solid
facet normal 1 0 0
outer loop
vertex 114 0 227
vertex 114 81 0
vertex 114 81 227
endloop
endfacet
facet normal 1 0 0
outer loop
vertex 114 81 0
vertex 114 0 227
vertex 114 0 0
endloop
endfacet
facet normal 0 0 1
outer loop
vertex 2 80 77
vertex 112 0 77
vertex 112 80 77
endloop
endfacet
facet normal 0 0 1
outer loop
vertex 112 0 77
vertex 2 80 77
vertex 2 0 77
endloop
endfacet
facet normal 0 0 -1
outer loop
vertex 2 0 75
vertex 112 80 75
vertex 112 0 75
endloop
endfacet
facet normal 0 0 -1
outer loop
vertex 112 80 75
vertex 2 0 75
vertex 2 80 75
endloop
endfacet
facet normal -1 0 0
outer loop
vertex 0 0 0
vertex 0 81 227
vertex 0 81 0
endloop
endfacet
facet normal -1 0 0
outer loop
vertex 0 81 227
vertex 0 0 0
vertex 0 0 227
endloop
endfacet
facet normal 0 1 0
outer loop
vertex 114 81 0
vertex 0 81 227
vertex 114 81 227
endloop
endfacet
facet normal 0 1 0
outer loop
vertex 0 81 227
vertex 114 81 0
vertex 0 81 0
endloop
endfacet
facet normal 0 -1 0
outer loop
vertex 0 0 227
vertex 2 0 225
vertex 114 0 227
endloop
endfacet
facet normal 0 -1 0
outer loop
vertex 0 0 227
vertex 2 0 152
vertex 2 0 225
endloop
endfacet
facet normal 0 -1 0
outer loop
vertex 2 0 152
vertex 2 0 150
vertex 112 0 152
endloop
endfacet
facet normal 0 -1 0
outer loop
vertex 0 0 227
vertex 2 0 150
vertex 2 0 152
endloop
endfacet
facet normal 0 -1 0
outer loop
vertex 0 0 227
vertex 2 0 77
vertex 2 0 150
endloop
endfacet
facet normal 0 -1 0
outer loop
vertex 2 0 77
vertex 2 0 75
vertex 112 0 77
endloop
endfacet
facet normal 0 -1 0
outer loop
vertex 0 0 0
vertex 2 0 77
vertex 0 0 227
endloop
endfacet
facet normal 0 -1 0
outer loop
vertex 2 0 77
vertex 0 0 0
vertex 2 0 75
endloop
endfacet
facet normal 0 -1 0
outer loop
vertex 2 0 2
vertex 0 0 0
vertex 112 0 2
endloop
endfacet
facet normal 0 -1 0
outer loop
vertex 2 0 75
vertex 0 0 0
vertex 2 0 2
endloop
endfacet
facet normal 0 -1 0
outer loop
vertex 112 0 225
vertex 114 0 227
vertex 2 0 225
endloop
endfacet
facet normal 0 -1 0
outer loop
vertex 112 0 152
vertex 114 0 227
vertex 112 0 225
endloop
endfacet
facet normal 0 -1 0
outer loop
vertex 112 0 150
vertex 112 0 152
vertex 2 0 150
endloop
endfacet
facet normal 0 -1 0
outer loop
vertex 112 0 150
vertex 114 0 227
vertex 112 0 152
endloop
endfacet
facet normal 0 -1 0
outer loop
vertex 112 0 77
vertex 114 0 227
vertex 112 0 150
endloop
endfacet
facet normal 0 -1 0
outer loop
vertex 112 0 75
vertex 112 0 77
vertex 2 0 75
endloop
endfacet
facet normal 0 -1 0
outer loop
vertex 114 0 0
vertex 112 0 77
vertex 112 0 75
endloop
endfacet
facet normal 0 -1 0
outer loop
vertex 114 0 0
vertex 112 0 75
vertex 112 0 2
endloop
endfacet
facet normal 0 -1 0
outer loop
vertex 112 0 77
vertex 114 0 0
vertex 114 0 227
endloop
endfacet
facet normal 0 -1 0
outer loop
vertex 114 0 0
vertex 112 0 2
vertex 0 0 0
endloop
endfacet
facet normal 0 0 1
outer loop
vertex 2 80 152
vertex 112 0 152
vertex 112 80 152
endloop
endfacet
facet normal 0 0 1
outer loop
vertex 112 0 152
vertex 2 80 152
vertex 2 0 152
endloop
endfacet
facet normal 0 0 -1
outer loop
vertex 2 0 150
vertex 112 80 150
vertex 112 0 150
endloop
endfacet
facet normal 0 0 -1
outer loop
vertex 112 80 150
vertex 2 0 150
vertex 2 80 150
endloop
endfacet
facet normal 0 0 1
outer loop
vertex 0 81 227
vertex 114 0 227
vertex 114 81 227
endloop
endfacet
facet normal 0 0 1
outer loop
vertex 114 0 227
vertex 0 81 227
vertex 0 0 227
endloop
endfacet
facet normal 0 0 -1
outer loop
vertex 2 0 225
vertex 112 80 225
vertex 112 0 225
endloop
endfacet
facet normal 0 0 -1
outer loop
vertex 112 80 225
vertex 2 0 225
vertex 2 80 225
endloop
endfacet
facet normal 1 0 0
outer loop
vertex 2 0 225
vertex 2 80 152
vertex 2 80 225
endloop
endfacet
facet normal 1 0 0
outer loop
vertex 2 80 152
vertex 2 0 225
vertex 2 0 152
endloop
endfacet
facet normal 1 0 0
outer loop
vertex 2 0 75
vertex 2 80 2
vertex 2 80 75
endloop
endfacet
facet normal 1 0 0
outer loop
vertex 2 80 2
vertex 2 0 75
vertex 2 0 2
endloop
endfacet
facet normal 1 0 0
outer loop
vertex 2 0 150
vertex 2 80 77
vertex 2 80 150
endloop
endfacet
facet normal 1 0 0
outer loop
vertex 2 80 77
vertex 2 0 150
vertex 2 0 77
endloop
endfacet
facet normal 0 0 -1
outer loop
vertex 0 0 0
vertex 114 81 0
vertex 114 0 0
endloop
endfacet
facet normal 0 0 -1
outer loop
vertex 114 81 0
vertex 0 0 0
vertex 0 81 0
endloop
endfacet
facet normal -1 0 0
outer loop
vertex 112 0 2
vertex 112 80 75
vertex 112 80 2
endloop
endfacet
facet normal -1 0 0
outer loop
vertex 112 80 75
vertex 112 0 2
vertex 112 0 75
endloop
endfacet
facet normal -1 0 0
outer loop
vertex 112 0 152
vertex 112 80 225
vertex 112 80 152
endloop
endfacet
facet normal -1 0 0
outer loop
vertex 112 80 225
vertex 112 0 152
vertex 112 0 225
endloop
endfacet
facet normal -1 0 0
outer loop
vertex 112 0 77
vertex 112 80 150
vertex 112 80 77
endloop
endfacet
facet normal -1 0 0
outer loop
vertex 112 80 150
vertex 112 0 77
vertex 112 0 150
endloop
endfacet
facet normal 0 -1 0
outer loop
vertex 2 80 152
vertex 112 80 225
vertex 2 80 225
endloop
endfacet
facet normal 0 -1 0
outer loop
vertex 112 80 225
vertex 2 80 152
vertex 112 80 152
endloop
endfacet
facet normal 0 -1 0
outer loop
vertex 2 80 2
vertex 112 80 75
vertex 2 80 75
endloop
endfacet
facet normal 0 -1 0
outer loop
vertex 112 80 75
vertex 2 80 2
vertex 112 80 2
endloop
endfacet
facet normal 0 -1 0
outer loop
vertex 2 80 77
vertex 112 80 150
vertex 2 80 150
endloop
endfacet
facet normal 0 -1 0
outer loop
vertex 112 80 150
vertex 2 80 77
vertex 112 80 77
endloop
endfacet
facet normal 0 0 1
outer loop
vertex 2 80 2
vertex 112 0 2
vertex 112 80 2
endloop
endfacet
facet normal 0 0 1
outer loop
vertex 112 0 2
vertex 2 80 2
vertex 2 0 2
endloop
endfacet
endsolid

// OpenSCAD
/*
    Multi-level mini storage shelving.  Can be customized for the number of identical sections.
    
    Settings for 3x 100g isobutane shelves
        shelves = 3;
        insideWidth = 110;
        insideDepth = 80;
        insideHeight = 73;
        wallThickness = 2;
        backThickness = 1;

*/


shelves = 3;
insideWidth = 110;
insideDepth = 80;
insideHeight = 73;
wallThickness = 2;
backThickness = 1;

// Calculated values
totalHeight = (insideHeight*shelves)+(wallThickness*(shelves+1));
echo()
echo("** Total Height = ", totalHeight, "mm");
echo()

// Left side
cube([
    wallThickness,
    insideDepth+backThickness,
    (insideHeight*shelves)+(wallThickness*(shelves+1))]);
// Right side
translate([insideWidth + wallThickness,0,0]) cube([
    wallThickness,
    insideDepth+backThickness,
    (insideHeight*shelves)+(wallThickness*(shelves+1))]);
// Back
translate([0,insideDepth,0]) cube([
    insideWidth + wallThickness*2,
    backThickness,
    (insideHeight * shelves) + (wallThickness * (shelves+1))]);
// Bottom
cube([
    insideWidth + wallThickness*2,
    insideDepth + backThickness,
    wallThickness
    ]);
// Top
translate([0,0,(insideHeight*shelves)+(wallThickness*(shelves))]) cube([
    insideWidth + wallThickness*2,
    insideDepth + backThickness,
    wallThickness
    ]);
// Inside shelves
for (i = [1 : shelves]) {
    translate([0, 0, i * (insideHeight + wallThickness)]) 
    cube([
        insideWidth + wallThickness*2,
        insideDepth + backThickness,
        wallThickness
        ]);
}


//difference(){
//    //cube([
//    //    insideWidth + wallThickness*2, 
//    //    insideDepth + wallThickness,
//    //    insideHeight + wallThickness*2]);
//    //cube([insideWidth, insideDepth,insideHeight]);
//}
